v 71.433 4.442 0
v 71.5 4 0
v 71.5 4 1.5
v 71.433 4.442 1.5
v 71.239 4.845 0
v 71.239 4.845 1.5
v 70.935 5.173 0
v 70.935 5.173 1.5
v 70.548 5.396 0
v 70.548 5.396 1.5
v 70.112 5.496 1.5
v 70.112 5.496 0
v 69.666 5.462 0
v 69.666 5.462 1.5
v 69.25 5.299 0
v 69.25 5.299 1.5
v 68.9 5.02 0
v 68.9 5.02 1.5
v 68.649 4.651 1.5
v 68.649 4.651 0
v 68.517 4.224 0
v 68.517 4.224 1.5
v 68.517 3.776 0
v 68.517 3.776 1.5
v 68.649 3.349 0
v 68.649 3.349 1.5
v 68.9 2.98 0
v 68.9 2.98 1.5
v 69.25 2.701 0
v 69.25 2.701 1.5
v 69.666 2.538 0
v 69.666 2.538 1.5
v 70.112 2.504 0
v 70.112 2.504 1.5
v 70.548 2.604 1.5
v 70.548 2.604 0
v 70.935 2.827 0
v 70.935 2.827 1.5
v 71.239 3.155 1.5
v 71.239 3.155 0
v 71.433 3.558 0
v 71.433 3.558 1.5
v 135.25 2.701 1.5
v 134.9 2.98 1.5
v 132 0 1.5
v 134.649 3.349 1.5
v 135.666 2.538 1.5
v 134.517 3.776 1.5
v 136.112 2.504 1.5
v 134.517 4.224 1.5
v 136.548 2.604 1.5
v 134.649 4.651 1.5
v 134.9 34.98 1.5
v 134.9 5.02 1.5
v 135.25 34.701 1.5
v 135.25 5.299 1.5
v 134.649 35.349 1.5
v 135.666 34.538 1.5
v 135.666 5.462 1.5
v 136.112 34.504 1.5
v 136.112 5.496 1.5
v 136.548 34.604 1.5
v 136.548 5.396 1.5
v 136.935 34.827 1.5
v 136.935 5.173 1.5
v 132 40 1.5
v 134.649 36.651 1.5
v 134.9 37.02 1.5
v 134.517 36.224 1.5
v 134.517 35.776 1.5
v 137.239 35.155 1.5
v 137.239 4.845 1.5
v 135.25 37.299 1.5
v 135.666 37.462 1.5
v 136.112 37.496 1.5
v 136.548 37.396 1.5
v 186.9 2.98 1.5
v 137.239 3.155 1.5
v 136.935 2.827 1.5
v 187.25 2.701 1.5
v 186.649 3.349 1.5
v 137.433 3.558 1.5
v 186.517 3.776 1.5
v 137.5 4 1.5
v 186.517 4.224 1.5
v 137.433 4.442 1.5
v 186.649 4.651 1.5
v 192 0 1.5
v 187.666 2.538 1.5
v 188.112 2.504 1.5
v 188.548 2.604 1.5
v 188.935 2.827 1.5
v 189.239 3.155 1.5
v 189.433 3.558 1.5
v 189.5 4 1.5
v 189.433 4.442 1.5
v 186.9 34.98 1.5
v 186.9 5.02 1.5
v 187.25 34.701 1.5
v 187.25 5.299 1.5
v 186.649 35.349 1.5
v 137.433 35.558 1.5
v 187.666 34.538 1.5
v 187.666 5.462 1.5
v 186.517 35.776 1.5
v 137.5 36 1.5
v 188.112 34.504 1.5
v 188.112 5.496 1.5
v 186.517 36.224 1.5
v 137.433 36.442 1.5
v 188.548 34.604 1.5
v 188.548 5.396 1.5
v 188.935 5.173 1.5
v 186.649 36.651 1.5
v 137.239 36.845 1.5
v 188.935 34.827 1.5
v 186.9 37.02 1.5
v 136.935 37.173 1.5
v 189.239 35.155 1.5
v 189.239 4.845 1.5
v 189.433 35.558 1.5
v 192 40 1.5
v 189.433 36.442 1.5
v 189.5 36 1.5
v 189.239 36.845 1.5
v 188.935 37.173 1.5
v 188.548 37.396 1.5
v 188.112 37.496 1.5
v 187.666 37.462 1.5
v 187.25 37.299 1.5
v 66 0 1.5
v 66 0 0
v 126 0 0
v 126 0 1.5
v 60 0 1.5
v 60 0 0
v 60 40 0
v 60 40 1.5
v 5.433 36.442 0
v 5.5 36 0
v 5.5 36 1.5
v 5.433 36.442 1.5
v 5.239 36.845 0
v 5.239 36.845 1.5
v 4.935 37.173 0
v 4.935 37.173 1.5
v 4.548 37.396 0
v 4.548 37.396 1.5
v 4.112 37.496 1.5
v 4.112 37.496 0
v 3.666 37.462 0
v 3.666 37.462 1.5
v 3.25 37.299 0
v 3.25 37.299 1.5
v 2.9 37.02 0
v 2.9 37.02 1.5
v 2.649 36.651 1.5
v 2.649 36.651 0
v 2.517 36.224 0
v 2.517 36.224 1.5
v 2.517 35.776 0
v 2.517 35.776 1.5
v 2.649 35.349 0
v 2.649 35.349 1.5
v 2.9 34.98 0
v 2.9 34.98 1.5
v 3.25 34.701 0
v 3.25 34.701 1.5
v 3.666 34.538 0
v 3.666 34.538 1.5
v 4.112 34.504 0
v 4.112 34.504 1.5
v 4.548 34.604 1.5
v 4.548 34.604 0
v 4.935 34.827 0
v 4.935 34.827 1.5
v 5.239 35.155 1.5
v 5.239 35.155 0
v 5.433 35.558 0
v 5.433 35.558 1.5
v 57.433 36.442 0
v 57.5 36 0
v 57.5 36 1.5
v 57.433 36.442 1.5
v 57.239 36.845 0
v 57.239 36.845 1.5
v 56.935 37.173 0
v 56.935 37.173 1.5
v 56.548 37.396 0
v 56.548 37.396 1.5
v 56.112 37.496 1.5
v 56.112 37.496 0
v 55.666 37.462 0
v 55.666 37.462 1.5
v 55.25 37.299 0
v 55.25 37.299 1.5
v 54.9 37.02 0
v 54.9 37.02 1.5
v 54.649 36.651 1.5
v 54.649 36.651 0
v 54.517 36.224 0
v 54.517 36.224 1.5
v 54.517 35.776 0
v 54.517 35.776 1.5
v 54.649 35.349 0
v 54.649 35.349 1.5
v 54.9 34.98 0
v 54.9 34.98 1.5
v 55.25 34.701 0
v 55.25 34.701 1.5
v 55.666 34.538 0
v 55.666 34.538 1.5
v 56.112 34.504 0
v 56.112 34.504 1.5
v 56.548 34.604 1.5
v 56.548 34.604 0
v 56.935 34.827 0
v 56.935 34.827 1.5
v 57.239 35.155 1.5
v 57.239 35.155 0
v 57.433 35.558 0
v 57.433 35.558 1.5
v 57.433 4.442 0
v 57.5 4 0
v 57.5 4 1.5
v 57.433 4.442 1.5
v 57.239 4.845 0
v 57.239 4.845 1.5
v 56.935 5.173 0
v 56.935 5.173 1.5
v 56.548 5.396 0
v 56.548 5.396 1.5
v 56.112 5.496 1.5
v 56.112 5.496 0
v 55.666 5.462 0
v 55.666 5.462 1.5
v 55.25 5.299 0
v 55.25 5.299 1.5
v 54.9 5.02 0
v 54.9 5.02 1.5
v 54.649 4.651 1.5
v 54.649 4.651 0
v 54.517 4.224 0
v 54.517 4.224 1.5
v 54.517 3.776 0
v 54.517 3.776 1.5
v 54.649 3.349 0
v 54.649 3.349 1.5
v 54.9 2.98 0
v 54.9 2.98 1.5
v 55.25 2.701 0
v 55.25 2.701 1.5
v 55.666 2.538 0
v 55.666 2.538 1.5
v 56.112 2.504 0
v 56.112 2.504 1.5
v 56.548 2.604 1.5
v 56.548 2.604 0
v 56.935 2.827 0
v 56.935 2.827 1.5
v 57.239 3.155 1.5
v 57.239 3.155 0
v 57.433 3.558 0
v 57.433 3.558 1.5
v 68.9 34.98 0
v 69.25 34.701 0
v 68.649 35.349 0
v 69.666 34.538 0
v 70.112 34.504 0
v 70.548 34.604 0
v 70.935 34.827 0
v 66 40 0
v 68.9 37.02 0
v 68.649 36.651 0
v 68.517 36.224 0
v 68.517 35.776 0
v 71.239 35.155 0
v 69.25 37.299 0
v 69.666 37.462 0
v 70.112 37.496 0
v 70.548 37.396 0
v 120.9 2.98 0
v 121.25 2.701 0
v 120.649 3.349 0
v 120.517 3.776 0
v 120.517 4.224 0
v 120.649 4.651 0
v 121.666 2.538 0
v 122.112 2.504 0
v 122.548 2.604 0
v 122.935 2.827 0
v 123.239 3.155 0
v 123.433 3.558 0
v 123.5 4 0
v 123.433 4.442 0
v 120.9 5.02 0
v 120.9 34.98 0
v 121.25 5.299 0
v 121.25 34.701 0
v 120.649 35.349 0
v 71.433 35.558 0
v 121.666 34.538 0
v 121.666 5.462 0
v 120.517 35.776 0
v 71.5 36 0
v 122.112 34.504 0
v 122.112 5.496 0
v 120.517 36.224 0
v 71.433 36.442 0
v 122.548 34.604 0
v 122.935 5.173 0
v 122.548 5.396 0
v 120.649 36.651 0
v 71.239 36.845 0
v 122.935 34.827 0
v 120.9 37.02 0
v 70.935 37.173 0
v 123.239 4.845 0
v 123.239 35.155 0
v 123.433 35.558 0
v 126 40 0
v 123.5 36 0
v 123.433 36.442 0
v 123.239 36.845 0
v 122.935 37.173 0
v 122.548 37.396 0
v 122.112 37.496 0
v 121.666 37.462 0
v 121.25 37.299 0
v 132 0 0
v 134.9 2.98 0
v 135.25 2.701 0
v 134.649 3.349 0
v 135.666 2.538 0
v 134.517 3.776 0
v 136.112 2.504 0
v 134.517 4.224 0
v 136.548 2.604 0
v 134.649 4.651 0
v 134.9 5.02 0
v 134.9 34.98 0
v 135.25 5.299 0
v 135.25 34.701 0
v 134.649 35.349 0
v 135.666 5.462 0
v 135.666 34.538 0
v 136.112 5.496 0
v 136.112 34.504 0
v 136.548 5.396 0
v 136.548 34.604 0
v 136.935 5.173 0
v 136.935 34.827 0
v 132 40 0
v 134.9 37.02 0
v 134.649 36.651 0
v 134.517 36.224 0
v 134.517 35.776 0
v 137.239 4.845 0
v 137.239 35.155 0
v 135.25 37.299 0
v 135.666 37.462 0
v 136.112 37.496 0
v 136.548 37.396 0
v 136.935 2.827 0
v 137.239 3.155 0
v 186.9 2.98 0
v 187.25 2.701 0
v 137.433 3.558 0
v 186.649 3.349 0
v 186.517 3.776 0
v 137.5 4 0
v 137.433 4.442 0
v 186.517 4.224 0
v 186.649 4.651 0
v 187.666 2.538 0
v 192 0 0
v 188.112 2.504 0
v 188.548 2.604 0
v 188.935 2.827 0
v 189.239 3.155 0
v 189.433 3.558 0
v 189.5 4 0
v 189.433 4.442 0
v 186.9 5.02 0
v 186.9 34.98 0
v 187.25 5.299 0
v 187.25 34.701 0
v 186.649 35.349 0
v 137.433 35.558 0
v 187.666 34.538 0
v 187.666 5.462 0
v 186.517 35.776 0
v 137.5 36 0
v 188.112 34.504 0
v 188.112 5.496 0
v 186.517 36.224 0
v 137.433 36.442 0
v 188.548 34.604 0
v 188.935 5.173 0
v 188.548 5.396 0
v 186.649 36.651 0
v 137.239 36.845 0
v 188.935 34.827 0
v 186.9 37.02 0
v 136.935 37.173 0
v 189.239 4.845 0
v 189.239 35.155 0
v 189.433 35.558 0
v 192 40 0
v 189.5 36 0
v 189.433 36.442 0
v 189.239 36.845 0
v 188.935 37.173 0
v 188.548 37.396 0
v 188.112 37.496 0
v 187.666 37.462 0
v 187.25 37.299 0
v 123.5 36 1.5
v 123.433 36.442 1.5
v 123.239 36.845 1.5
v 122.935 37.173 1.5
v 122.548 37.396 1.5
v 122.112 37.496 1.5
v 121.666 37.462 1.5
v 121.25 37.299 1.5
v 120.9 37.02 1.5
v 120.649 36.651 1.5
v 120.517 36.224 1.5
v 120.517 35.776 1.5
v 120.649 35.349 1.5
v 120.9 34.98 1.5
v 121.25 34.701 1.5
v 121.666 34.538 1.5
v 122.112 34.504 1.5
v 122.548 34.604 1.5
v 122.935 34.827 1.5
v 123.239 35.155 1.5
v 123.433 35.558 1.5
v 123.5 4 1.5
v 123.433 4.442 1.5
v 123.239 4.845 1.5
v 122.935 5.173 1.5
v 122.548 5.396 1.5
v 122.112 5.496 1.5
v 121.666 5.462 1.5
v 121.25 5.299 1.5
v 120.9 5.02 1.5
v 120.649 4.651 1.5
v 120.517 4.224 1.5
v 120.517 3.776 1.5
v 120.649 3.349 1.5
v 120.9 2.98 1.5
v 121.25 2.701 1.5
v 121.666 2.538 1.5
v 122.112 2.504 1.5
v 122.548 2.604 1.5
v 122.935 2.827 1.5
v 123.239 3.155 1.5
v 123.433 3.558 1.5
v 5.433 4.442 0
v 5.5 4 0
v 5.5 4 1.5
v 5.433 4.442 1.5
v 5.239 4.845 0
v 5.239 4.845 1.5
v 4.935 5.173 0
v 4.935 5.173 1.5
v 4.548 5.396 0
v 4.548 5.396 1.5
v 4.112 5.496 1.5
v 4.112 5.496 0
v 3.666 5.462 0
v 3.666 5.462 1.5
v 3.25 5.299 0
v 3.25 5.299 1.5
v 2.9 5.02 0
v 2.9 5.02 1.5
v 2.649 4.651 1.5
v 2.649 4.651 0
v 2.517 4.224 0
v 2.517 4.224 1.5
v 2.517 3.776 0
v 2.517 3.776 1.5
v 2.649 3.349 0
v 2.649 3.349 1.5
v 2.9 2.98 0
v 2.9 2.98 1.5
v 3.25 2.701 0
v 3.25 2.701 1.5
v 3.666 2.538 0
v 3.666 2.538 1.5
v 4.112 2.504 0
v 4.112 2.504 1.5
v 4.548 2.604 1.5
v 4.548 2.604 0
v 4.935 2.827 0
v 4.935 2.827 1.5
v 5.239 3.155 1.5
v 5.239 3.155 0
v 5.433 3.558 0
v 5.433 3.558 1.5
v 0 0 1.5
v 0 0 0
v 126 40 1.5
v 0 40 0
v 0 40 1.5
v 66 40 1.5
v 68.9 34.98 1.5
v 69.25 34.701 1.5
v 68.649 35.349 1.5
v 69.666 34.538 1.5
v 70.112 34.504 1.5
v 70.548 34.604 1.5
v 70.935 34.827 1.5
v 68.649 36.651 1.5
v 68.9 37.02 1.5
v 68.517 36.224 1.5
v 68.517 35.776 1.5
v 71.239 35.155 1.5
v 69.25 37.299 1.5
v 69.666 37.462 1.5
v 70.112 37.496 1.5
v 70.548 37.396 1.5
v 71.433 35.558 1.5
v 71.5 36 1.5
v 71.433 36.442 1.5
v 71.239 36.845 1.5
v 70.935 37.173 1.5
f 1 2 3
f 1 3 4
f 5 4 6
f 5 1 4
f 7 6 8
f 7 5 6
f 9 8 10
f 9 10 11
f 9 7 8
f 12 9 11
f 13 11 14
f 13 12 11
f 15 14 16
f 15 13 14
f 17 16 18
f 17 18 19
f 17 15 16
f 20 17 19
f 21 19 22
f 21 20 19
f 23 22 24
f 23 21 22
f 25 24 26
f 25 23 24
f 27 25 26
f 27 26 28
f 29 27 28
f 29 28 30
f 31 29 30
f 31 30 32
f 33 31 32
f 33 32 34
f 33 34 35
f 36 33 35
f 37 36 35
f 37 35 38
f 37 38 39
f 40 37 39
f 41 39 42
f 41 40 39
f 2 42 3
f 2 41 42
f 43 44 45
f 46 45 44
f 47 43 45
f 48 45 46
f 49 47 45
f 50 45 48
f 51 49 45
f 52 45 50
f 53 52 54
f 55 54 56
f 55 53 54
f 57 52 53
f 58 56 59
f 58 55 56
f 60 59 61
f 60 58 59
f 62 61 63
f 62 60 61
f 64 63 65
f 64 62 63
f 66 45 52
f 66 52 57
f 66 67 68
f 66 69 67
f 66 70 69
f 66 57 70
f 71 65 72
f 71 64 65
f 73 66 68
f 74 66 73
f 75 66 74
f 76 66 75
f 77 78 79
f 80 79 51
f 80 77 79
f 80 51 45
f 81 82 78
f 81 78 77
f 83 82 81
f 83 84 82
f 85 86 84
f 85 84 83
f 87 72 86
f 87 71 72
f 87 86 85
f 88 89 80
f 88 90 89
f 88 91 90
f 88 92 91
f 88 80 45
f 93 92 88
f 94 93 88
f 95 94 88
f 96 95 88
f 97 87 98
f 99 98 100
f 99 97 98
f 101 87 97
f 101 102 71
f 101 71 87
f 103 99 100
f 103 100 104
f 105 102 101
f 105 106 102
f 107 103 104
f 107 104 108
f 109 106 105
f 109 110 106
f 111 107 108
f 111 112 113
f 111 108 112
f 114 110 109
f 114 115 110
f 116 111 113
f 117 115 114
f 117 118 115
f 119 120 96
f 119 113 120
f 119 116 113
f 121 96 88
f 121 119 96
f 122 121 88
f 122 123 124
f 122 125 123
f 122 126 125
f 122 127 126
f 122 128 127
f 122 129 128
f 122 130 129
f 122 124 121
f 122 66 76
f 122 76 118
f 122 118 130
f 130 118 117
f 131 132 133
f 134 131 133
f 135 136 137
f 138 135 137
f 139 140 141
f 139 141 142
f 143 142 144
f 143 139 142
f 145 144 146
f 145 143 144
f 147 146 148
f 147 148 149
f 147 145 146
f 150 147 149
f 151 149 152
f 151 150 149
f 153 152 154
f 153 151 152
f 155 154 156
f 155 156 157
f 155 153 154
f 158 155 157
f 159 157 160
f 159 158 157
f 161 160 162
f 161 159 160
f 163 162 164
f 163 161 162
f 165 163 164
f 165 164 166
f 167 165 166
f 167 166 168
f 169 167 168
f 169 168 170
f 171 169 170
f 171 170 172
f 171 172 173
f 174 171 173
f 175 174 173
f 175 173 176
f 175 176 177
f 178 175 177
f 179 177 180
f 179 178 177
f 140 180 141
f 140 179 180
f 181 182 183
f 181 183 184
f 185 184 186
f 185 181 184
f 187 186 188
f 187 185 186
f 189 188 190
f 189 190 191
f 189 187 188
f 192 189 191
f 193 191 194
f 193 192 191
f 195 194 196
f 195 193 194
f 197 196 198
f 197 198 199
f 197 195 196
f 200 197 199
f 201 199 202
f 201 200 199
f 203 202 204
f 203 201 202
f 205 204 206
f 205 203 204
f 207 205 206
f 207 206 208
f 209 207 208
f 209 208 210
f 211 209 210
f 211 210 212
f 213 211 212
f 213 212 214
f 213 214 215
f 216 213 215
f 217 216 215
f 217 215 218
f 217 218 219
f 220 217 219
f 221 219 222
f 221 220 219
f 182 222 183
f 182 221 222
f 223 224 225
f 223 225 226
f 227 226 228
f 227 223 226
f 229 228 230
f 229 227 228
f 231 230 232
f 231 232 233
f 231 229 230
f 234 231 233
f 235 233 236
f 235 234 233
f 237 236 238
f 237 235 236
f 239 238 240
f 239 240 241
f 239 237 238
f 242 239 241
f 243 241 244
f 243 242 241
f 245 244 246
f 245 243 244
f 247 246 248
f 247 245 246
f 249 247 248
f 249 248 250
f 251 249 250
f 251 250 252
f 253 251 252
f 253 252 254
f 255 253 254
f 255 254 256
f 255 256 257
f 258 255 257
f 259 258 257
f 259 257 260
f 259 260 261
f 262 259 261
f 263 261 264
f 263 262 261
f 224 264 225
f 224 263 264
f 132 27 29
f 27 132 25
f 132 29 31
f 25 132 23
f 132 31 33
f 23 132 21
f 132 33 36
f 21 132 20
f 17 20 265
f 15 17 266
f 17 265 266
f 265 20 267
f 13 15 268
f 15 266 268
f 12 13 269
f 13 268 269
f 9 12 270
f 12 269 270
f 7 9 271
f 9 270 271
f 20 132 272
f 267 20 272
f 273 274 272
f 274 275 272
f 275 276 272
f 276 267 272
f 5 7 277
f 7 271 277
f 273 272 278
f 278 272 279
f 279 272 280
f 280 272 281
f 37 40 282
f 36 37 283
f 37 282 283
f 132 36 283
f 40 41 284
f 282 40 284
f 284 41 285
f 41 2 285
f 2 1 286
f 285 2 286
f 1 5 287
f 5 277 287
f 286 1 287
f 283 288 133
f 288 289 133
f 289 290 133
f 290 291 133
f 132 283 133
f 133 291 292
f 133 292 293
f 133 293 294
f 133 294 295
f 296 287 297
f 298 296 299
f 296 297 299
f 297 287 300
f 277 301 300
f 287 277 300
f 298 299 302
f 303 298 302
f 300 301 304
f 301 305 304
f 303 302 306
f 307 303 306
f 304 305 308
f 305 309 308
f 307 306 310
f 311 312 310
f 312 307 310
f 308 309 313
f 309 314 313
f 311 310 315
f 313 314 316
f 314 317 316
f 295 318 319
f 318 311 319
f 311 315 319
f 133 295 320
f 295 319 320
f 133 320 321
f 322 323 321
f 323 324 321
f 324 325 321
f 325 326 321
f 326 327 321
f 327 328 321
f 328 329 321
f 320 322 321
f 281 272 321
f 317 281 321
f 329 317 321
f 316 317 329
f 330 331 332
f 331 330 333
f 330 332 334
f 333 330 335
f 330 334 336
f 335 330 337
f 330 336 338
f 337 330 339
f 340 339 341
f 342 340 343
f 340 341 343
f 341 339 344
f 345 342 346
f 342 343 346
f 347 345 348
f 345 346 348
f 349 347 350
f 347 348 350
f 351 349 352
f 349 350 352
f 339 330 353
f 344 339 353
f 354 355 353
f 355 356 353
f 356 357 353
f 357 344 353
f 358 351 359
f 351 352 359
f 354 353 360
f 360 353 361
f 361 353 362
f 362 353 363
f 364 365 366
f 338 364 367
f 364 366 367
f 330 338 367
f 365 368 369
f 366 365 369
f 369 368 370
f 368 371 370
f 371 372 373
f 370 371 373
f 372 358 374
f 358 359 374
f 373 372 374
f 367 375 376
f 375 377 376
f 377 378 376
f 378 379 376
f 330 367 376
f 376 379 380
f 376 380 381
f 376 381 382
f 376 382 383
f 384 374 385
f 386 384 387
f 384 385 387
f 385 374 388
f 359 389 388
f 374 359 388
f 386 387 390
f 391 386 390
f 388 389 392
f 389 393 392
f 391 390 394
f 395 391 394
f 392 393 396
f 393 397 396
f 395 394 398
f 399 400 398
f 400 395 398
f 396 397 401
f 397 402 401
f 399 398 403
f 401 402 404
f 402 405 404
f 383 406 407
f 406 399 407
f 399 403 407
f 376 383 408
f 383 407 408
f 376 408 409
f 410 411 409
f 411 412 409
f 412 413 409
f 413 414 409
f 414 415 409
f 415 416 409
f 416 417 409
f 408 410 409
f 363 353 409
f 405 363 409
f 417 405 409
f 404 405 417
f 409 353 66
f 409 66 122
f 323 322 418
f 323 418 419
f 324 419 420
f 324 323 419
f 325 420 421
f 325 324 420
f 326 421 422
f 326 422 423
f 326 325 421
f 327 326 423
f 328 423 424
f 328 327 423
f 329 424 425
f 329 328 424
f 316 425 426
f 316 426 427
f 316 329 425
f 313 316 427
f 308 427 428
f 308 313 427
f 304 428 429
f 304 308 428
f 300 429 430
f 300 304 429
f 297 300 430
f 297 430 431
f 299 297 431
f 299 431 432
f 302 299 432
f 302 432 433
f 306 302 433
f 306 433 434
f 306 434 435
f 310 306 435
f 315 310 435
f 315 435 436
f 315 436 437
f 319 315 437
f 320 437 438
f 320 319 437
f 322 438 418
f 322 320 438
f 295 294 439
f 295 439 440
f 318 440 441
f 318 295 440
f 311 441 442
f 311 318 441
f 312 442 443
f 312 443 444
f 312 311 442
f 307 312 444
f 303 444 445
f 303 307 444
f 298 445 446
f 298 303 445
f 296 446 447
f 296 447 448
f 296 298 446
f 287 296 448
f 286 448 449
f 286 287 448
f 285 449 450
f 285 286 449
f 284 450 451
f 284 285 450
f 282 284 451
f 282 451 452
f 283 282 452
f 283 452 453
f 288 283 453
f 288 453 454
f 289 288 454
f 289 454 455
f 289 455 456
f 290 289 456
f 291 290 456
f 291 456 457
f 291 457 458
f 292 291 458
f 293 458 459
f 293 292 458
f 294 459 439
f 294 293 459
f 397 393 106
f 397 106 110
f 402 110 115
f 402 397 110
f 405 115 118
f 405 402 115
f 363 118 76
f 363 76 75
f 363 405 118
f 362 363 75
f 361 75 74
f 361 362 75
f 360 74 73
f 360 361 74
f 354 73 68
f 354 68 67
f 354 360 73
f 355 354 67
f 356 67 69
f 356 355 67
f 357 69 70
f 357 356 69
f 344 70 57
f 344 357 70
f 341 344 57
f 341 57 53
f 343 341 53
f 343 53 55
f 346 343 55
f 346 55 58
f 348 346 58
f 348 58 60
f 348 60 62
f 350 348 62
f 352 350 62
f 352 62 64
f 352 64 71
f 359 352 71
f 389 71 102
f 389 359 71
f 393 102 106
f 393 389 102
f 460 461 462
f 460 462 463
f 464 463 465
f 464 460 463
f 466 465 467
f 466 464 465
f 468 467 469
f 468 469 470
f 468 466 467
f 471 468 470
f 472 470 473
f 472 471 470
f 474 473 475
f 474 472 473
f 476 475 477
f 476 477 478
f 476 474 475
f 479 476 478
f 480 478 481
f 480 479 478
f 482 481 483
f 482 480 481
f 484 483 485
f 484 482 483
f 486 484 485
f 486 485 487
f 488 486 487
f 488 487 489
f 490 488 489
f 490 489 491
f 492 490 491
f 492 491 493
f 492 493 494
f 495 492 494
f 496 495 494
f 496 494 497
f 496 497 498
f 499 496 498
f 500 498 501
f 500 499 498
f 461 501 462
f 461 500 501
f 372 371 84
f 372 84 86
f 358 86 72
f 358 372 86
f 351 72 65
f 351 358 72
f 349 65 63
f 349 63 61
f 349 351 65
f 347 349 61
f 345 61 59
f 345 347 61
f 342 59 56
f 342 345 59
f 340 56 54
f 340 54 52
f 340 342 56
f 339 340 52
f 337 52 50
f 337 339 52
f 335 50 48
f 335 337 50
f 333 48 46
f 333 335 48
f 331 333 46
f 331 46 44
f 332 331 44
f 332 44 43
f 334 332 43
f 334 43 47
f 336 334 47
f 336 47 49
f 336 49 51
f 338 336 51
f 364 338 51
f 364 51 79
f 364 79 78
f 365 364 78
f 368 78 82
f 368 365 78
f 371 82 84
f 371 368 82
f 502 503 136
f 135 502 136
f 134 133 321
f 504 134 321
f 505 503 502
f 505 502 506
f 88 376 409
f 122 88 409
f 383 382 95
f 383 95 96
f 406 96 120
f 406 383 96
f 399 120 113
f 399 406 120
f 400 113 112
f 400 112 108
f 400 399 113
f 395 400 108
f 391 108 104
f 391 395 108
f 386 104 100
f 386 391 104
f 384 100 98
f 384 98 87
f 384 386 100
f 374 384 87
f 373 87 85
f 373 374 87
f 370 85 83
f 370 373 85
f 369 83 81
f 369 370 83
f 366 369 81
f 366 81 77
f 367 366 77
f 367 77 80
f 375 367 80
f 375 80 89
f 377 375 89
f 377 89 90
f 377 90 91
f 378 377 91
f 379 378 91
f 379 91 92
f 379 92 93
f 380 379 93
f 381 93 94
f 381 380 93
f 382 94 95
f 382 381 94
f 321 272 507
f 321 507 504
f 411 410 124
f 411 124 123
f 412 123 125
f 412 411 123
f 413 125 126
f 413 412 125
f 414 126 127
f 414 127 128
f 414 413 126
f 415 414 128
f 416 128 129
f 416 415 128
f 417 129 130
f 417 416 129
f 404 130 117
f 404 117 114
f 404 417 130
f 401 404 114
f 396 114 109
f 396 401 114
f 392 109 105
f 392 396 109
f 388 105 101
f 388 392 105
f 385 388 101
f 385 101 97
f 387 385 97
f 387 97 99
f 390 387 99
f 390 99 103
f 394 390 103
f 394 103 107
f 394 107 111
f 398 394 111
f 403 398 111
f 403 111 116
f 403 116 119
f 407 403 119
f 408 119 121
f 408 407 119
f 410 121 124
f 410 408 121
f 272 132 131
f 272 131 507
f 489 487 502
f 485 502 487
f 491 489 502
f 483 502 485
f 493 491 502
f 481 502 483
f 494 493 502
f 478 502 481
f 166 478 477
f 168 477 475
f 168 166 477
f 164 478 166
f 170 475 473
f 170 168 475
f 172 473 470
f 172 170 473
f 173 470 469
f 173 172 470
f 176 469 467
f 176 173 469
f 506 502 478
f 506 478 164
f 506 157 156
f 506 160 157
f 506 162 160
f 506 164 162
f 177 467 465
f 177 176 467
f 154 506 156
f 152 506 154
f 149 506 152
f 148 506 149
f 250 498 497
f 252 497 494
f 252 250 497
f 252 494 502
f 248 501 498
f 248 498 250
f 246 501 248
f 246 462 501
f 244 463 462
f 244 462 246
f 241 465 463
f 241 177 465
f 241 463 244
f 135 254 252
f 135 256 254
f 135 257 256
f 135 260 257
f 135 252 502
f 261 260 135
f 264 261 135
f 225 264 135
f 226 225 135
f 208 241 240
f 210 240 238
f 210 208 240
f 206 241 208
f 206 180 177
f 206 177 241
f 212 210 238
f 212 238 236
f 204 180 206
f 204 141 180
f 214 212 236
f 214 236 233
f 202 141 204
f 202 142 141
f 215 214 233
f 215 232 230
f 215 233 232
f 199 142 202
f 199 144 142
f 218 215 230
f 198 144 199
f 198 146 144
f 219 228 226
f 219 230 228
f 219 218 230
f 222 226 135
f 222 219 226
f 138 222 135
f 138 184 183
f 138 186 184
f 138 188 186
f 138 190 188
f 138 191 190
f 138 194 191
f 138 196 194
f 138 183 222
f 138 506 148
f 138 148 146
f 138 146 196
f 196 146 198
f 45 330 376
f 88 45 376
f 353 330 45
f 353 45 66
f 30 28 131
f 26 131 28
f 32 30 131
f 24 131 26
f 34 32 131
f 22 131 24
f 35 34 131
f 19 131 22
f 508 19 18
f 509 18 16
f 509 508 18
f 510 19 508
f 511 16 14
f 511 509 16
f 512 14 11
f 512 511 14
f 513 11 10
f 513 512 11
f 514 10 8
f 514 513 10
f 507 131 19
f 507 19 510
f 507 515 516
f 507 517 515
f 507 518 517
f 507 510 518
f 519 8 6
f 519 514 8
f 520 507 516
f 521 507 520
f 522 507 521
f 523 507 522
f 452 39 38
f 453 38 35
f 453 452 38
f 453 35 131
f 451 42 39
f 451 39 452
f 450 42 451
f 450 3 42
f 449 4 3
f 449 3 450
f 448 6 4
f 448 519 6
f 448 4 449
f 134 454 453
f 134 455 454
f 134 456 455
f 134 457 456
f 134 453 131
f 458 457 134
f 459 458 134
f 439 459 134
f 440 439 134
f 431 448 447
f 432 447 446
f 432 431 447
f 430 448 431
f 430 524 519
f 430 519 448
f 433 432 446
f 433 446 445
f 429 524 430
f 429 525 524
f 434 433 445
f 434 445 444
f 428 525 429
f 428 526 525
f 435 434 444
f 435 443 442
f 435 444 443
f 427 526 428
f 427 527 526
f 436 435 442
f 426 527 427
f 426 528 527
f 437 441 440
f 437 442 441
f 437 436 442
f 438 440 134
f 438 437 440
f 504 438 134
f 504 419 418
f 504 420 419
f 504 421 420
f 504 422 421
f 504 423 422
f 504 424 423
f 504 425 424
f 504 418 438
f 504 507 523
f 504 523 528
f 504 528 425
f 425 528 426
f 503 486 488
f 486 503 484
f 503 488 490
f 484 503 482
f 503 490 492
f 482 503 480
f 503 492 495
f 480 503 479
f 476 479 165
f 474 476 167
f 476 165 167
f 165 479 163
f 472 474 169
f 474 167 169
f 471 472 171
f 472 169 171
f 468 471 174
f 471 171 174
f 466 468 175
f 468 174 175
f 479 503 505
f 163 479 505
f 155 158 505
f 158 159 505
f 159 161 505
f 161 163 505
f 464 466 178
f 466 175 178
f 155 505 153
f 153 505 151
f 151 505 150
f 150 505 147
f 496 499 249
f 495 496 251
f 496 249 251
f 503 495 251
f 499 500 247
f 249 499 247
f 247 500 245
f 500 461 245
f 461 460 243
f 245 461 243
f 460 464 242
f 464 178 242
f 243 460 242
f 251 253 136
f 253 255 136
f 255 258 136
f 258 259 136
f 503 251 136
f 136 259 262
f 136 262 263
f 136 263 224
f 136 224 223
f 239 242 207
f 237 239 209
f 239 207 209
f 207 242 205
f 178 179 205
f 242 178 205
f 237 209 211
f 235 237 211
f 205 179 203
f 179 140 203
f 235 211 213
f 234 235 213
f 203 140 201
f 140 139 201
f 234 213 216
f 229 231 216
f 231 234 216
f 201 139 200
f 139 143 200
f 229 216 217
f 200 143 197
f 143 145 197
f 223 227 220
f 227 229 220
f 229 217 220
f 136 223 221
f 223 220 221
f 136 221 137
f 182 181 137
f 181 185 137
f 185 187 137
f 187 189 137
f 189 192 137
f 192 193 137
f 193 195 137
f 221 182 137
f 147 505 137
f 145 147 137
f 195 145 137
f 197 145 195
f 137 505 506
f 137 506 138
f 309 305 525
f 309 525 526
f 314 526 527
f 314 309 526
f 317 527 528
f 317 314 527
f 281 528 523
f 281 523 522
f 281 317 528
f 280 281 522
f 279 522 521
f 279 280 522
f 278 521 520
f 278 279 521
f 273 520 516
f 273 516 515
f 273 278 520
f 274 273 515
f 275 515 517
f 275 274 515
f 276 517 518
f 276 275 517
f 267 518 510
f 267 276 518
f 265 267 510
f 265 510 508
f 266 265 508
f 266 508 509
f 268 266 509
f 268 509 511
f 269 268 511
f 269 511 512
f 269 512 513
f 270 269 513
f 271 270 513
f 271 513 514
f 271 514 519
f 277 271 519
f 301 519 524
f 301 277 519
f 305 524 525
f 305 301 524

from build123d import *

# Parameters (mm, degrees)
SKETCH_1_W        = 60
SKETCH_1_H        = 40
SKETCH_1_R        = 1.5
EXTRUDE_1_DEPTH   = 1.5
EXTRUDE_1_2_DEPTH = 1.5
EXTRUDE_1_3_DEPTH = 1.5


with BuildPart() as part:
    # Эскиз1 → Бобышка-Вытянуть1 (new body)
    with BuildSketch(Plane.XY):
        with Locations((96, 20)):
            Rectangle(SKETCH_1_W, SKETCH_1_H)
        with Locations((70, 36)):
            Circle(SKETCH_1_R, mode=Mode.SUBTRACT)
        with Locations((122, 36)):
            Circle(SKETCH_1_R, mode=Mode.SUBTRACT)
        with Locations((122, 4)):
            Circle(SKETCH_1_R, mode=Mode.SUBTRACT)
        with Locations((70, 4)):
            Circle(SKETCH_1_R, mode=Mode.SUBTRACT)
    extrude(amount=EXTRUDE_1_DEPTH)


with BuildPart() as body_2:
    # Эскиз1 → Extrude 1 2 (new body)
    with BuildSketch(Plane.XY):
        with Locations((30, 20)):
            Rectangle(SKETCH_1_W, SKETCH_1_H)
        with Locations((4, 4)):
            Circle(SKETCH_1_R, mode=Mode.SUBTRACT)
        with Locations((56, 4)):
            Circle(SKETCH_1_R, mode=Mode.SUBTRACT)
        with Locations((56, 36)):
            Circle(SKETCH_1_R, mode=Mode.SUBTRACT)
        with Locations((4, 36)):
            Circle(SKETCH_1_R, mode=Mode.SUBTRACT)
    extrude(amount=EXTRUDE_1_2_DEPTH)


with BuildPart() as body_3:
    # Эскиз1 → Extrude 1 3 (new body)
    with BuildSketch(Plane.XY):
        with Locations((162, 20)):
            Rectangle(SKETCH_1_W, SKETCH_1_H)
        with Locations((136, 36)):
            Circle(SKETCH_1_R, mode=Mode.SUBTRACT)
        with Locations((188, 36)):
            Circle(SKETCH_1_R, mode=Mode.SUBTRACT)
        with Locations((188, 4)):
            Circle(SKETCH_1_R, mode=Mode.SUBTRACT)
        with Locations((136, 4)):
            Circle(SKETCH_1_R, mode=Mode.SUBTRACT)
    extrude(amount=EXTRUDE_1_3_DEPTH)


solid = Compound([part.part, body_2.part, body_3.part])
